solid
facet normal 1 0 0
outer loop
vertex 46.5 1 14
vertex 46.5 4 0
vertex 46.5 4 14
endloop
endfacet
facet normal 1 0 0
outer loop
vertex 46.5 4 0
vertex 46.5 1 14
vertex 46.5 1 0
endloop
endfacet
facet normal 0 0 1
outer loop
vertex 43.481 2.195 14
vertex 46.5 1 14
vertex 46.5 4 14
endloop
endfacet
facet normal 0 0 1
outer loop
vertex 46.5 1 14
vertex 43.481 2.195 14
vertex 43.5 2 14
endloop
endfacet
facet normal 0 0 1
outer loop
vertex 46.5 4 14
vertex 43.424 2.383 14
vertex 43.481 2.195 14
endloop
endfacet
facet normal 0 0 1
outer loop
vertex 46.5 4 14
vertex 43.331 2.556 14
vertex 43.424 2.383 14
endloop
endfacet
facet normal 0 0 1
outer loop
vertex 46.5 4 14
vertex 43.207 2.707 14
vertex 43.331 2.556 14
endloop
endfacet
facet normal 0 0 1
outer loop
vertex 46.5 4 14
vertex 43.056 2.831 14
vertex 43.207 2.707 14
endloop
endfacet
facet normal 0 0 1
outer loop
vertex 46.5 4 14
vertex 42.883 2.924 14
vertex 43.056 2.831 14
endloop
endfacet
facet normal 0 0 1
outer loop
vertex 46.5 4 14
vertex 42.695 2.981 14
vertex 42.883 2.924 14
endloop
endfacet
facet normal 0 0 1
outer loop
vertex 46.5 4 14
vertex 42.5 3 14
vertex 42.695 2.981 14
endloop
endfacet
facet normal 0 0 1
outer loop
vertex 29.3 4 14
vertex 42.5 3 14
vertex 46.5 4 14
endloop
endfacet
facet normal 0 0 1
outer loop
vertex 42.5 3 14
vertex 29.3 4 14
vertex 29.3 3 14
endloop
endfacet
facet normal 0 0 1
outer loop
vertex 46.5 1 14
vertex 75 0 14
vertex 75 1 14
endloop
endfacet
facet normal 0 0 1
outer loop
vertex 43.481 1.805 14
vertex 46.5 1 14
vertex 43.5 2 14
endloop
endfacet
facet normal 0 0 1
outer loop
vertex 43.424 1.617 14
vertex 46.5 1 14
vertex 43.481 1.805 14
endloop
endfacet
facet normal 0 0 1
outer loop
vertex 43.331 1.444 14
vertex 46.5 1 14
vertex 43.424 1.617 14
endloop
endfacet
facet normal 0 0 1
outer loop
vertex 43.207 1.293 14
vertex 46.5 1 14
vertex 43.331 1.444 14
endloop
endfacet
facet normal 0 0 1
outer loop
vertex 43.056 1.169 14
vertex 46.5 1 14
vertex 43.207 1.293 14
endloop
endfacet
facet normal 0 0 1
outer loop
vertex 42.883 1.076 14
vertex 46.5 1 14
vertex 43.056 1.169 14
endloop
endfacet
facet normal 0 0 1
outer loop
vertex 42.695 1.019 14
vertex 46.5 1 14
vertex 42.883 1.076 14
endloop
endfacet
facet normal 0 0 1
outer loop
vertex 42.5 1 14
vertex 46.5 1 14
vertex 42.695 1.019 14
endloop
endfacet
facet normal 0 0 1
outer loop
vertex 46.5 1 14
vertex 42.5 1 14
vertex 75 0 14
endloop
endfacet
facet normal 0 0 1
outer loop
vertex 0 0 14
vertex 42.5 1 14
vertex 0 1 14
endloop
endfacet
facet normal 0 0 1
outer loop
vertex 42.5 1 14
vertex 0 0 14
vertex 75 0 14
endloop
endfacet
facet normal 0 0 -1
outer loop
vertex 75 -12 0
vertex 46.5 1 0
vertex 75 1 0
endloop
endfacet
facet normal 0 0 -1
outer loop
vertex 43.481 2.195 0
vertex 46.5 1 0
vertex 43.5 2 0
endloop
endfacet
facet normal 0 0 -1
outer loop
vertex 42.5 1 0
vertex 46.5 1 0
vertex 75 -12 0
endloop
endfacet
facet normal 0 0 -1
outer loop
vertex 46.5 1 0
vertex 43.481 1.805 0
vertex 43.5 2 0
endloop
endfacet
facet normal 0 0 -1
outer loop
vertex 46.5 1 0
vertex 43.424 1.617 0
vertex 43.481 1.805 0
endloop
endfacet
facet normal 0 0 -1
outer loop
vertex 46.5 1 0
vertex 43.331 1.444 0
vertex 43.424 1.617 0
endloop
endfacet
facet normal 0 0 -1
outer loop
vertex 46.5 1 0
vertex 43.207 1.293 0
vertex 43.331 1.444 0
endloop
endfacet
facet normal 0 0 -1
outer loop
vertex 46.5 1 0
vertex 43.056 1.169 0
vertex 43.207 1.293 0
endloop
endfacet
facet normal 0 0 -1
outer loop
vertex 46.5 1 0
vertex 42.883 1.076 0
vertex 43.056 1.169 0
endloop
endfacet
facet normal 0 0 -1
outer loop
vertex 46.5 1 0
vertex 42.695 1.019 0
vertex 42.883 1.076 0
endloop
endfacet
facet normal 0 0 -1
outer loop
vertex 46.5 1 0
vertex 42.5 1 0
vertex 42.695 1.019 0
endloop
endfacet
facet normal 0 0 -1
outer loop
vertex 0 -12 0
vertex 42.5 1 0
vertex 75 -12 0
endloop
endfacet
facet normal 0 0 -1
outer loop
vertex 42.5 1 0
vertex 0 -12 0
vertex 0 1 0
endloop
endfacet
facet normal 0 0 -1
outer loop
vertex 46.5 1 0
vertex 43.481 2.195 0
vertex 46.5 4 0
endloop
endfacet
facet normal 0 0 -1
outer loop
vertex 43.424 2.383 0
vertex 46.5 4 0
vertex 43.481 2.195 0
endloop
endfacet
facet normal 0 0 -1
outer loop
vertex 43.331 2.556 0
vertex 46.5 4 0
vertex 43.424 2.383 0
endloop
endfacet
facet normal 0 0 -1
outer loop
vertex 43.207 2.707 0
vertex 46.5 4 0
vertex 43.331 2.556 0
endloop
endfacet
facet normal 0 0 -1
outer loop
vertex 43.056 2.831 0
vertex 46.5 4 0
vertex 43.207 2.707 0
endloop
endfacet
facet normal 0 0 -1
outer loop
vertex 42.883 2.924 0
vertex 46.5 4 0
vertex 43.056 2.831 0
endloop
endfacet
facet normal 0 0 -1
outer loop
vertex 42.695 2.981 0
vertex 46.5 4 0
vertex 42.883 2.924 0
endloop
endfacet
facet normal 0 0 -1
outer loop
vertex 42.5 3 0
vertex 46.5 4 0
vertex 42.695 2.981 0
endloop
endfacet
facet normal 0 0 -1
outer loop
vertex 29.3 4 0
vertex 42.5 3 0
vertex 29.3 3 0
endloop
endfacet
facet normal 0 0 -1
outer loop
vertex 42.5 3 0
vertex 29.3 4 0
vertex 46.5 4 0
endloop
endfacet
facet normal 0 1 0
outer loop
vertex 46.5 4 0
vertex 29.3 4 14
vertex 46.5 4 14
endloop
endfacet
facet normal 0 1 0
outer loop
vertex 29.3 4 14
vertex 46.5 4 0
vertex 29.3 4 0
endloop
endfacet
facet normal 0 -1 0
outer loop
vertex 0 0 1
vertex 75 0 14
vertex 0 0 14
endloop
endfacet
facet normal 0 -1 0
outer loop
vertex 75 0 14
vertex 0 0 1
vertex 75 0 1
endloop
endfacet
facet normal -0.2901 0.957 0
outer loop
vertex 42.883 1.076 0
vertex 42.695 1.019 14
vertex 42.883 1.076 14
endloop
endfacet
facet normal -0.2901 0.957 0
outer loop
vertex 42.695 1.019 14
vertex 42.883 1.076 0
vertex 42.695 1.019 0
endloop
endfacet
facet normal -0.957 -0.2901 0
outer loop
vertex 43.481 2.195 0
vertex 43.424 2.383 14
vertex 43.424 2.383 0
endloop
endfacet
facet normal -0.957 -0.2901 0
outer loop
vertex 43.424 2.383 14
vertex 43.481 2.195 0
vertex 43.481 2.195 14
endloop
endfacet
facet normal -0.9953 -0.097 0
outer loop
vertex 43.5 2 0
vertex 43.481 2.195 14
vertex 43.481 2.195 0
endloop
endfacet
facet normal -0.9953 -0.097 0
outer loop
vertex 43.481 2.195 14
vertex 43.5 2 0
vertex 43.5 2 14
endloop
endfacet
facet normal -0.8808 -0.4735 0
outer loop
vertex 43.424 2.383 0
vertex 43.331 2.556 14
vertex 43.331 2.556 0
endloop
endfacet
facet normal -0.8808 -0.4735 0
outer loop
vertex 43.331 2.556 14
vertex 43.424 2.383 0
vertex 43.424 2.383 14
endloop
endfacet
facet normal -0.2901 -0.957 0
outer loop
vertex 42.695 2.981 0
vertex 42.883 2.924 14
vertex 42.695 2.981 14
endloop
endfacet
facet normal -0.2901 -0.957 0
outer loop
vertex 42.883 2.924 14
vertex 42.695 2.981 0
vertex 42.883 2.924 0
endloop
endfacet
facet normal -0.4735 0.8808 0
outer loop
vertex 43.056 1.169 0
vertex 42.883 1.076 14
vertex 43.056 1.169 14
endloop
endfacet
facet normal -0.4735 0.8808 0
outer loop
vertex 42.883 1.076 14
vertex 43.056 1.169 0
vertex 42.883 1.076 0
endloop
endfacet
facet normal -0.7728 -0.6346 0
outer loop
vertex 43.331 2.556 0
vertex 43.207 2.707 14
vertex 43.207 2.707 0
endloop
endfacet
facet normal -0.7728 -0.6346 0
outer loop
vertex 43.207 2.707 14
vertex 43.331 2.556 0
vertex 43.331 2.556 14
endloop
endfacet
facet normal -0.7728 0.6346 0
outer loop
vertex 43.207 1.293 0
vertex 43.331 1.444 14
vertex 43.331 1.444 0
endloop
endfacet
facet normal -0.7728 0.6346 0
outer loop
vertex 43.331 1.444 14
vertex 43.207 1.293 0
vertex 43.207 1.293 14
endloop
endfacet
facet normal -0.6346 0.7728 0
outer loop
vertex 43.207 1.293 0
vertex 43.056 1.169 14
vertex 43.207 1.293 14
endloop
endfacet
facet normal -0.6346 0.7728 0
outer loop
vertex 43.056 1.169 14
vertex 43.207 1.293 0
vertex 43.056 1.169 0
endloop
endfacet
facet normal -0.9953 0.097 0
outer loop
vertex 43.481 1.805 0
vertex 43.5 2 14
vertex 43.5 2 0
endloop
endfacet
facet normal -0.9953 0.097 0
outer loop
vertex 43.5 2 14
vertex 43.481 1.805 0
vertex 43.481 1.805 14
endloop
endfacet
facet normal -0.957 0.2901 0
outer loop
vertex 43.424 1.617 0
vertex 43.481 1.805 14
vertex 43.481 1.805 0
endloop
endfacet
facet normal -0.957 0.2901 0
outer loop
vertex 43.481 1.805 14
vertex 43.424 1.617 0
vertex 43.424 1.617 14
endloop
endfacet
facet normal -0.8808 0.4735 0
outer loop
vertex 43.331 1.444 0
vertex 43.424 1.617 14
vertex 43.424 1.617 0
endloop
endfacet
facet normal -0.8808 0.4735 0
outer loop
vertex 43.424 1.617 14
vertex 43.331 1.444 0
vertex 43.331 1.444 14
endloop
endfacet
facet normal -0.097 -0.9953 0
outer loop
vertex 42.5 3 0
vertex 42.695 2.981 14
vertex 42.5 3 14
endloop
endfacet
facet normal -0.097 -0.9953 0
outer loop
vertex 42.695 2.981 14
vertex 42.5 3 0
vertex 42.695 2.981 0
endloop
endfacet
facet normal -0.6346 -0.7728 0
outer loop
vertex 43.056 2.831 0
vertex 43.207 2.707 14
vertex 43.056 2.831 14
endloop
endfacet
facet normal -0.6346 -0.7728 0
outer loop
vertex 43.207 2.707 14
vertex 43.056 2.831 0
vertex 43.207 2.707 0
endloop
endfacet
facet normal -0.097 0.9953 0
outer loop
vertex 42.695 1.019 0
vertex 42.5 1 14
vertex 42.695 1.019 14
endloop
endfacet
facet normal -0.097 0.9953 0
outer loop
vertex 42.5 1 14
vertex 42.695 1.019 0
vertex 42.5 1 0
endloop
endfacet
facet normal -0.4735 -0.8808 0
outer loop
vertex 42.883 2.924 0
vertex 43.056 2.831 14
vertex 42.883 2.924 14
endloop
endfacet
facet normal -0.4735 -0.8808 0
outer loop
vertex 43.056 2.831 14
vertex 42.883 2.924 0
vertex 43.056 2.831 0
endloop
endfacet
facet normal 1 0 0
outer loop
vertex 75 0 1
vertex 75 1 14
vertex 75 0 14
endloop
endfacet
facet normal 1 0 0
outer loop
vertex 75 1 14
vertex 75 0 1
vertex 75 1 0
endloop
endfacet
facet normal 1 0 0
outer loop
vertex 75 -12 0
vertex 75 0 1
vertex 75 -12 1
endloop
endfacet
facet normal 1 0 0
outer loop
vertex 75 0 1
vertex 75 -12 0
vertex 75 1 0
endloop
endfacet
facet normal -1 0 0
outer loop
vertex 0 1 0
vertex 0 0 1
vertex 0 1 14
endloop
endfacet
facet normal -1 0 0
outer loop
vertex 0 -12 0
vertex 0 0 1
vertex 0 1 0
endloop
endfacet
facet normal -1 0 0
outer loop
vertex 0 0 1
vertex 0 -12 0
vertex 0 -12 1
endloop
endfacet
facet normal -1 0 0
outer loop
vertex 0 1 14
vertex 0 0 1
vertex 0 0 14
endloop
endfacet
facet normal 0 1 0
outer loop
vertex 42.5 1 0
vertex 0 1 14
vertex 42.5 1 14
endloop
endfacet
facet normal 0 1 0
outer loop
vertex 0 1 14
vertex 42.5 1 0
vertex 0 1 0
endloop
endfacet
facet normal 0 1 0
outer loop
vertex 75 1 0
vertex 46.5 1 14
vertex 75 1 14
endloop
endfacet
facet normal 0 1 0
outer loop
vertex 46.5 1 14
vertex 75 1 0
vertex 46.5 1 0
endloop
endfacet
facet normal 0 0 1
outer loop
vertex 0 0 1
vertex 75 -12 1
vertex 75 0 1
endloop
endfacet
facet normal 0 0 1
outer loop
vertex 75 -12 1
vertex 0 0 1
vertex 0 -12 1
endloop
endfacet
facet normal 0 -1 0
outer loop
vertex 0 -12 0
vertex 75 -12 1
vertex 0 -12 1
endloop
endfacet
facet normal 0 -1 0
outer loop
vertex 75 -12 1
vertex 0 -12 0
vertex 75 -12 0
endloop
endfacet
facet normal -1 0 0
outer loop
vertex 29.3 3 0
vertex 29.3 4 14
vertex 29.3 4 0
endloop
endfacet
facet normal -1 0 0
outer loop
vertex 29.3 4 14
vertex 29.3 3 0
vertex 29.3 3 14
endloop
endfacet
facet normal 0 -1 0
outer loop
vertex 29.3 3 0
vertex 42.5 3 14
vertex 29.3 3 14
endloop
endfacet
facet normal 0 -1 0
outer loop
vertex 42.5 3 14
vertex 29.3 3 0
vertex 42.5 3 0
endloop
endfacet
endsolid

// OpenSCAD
//////////////////////////////////////////////////////////////////////////////////////
///
///  FLEXBATTER: Flexing battery holder with built-in spring
///
///  This file generates battery holders for arbitrary cylindrical sizes.
///  The number of batteries and their size is fully parametrized.
///
///  The usual metallic spring at the minus pole is replaced by a
///  flexible printed spring, which is pressing the contacts firmly to 
///  the battery.
///
///  The contacts for the plus and minus pole can easily be made by
///  a few windings of the uninsulated ends of the connecting wires.
///  Each battery compartment contains are several holes to the outside
///  as well ad to the neighboring compartments, through which connecting
///  wires can be passed for easy configuring of parallel, serial or
///  balanced-serial battery packs.
///  
///  The preconfigured battery sizes are:
///  AA, AAA, C, D, 18650(Li-Ion), 18650P(protected Li-Ion), CR123A(16340)
///  
///  Given that the printed plastic spring needs to be flexible, ABS is the material
///  of choice here.
///
//////////////////////////////////////////////////////////////////////////////////////
///
///  2014-09-09 Heinz Spiess, Switzerland
///
///  released under Creative Commons - Attribution - Share Alike licence (CC BY-SA)
//////////////////////////////////////////////////////////////////////////////////////

// build a cube with chamfered edges
module chamfered_cube(size,d=1){
   hull(){
     translate([d,d,0])cube(size-2*[d,d,0]);
     translate([0,d,d])cube(size-2*[0,d,d]);
     translate([d,0,d])cube(size-2*[d,0,d]);
   }
}


// draw an arc width height h between radius r1..r2 and angles a1..a2
module arc(r1,r2,h,a1=0,a2=0){
     if(a2-a1<=180){
        difference(){
           cylinder(r=r2,h=h);
           translate([0,0,-1])cylinder(r=r1,h=h+2);
	   rotate(a2)translate([-r1-r2,0,-1])cube([2*(r1+r2),2*(r1+r2),h+2]);
	   rotate(a1+180)translate([-r1-r2,0,-1])cube([2*(r1+r2),2*(r1+r2),h+2]);
        }
     } else {
           difference(){
              cylinder(r=r2,h=h);
              translate([0,0,-1])cylinder(r=r1,h=h+2);
              intersection(){
	       rotate(a2)translate([-r1-r2,0,-1])cube([2*(r1+r2),2*(r1+r2),h+2]);
	       rotate(a1+180)translate([-r1-r2,0,-1])cube([2*(r1+r2),2*(r1+r2),h+2]);
	      }
           }
     }
}

/////////////////////////////////////////////////////////////////////////////////
// sline - generate a "snake line" of width w and height h 
// with a arbitrary sequence of segments defined by a radius and a turning angle
//
//   angle[i] > 0  left turn / counter-clockwise
//   angle[i] < 0  left turn / clockwise
//   angle[i] = 0  straight segment with length radius[i]
//
/////////////////////////////////////////////////////////////////////////////////
// Heinz Spiess, 2014-09-06 (CC BY-SA)
/////////////////////////////////////////////////////////////////////////////////
module sline(angle,radius,i,w,h){
   scale([angle[i]>=0?1:-1,1,1])
      assign(r=abs(radius[i]))assign(a=angle[i])
         translate([a?r:0,0,0]){
	    translate([-w/2,-r-0.01,0])cube([w,0.02,h]); // tiny overlap!
            if(a)arc(r-w/2,r+w/2,0,a,h=h);
	    else if(r>0)translate([-w/2,-r,0])cube([w,r,h]);
      if(i+1<len(angle))
           rotate(angle[i])
	      translate([a?-r:0,a?0:-r,0])
	         sline(angle,radius,i+1,w,h);
  }
}

//////////////////////////////////////////////////////////////////////////////////
//
//  FLEXBATTER:  Flexing battery holder with integrated plastic spring
//
//////////////////////////////////////////////////////////////////////////////////
module flexbatter(n=1,l=65,d=18,hf=0.75,r=4,shd=3,eps=0.28,el=0,xchan=[1/4,3/4],$fn=24){
ew=0.56;   // extrusion width
eh=0.25;   // extrusion height
w = 4*ew;  // case wall thickness
ws = 2*ew; // spring wall thickness
ch = w-ws; // edge chamfering
deepen=0; //deepening for side grip of batteries
//el = 0;  // extra length in spring
//eps = 0.28;
//shd = 3; // screw hole diameter
//hf=0.75;
//xchan=[1/4,3/4]; // relative position of traversal wire channels

r = d/5+2*ws; // linear spring length (depends on sline() call!)

   for(i=[0:n-1])translate([0,i*(d+w+ws),0]){ // generate n battery cases
      difference(){
         
         union(){
            difference(){
               // main body
               translate([0,-w-d/2,0])
	          chamfered_cube([l+w,d+2*w+(i<n-1?ws:0),hf*d+w+ch],ch);
	       // main cavity
               translate([-2,-d/2,w])cube([2+l,d,d+1]);
	       // cavity for locating plastic spring
               translate([-1,-d/2,-1])cube([2,d,d+w+2]);
	       // small cylindrical carving of walls and bottom
	       if(eps>0)translate([-1,0,d/2+w])rotate([0,90,0])cylinder(r=d/2+eps,h=l+1);
            }
      
            // plastic spring for minus pole
            for(sy=[-1,1])scale([1,sy,1])assign(D=d+2*w-2*ws-0.7){
               translate([ch,d/2+w-ws/2,0])rotate(-90)
		  //sline([90,0,120,90,120,90,0],[d/8+2,d/6,d/8-1,d/8,-d/8,d/8,d/2],0,ws,hf*d+w);
		  sline([0,180,0,180,0,-180,0,90,0],[r+ch+el,D/4,el,D/12,el/2,D/12,1+el/2,D/5,D/3],0,ws,hf*d+w);


            }
         }
      
         // lower and upper holes for contacts
         for(z=[-2*ws,2*ws])
            translate([-2*ws,-w,w-ws/2+d/2+z])cube([l+2*w+2,2*w,ws]);
      
         // longitudinal bottom wire channel
         translate([-2*ws,0,0])rotate([0,90,0])cylinder(r=w/2,h=l+w+2+r,$fn=5);
      
         // traversal bottom wire channels
         for(x=l*xchan)translate([x,-d/2-w-1,eh]) rotate([-90,0,0])cylinder(r=w/2,h=d+2*w+ws+2,$fn=6);
   
         // grip deepening
	 if(deepen>0)
            translate([w+l/2-0.5,-d/2-w-0.01,w+d+l])
	       rotate([-90,0,0]){
	          cylinder(r=l+deepen*d,h=d+2*w+2*ws+2,$fn=72);
	          if(i==0)cylinder(r1=l+deepen*d+ch,r2=l+deepen*d,h=ch+0.02,$fn=72);
	          if(i==n-1)translate([0,0,d+2*w-ch])cylinder(r2=l+deepen*d+ch,r1=l+deepen*d,h=ch+0.02,$fn=72);

               }
         // conical screw holes in corners
         for(x=[7+shd,l-2*shd])for(y=[-d/2+shd,d/2-shd])
             translate([x,y,-1]){
                cylinder(r=shd/2,h=w+2);
                translate([0,0,w-shd/2+1])cylinder(r1=shd/2,r2=shd,h=shd/2+0.01);
             }

         // holes for wires passing inside
         for(sy=[-1,1])scale([1,sy,1]){
	    translate([l-1,-d/2,w])cube([w+2,2,2]);
            for(x=[3,l-7])translate([x,-d/2-w-ws-1,w])cube([3,w+ws+3,2]); 
            translate([3,-d/2+w/2-0.75,-1])cube([3,1.5,w+2]); 
            translate([-0.5,-d/2+w/2,0])rotate([0,90,0])cylinder(r=w/2,h=6.5,$fn=5);
         }

         // engrave battery symbol
	 translate([w+l/2,d/4+1,w])cube([l/5,d/4.5,4*eh],true);
	 translate([w+l/2+l/10,d/4+1,w])cube([d/7,d/10,4*eh],true);
	 // engrave plus symbol
	 assign(sy=(l>12*shd)?1:-1){ // for short batteries +- on the side
	    translate([w+l/2+l/(sy>0?5:10),sy*(d/4+1),w]){
	       cube([1,d/4,4*eh],true);
	       cube([d/4,1,4*eh],true);
            }
	 // engrave minus symbol
	    translate([w+l/2-l/(sy>0?5:10),sy*(d/4+1),w])
	       cube([1,d/4,4*eh],true);
         }
   
         //correction for middle separators
         //if(i<n-1) translate([-d,d/2+w-ws/2,-1])cube([d,ws/2+0.1,d+2]);
	 //else translate([1,d/2+w,-0.01])cylinder(r1=ch,r2=0,h=ch);
         //if(i>0) translate([-d,-d/2-w-0.1,-1])cube([d,ws/2+0.1,d+2]);
	 //else translate([1,-d/2-w,-0.01])cylinder(r1=ch,r2=0,h=ch);


      }


      // horizontal contact bulges (+ and - pole)
      for(x=[-0.3,l])
         hull()for(y=[-3+el,3-el])
            translate([x,y,w+d/2])sphere(r=ws);
   
      // vertical contact bulge (+ pole only)
      if(0)hull()for(z=[-3+el,3-el])for(x=[0,w-ws])
            translate([l+x,0,w+d/2+z])sphere(r=ws);



   }

}

module flexbatter18650(n=1){
   flexbatter(n=n,l=65.5,d=18.4,hf=0.75,shd=3,eps=0.28);
}  

module flexbatter18650P(n=1){
   flexbatter(n=n,l=67.5,d=18.4,hf=0.75,shd=3,eps=0.28);
}  

module flexbatterCR123A(n=1){
   flexbatter(n=n,l=35.1,d=16.7,hf=0.75,shd=3,xchan=[0.5],eps=0.28);
}  

module flexbatterD(n=1){
   flexbatter(n=n,l=61.5,d=34.0,hf=0.75,shd=3,eps=0.28);
}  

module flexbatterC(n=1){
   flexbatter(n=n,l=51.6,d=26.4,hf=0.75,shd=3,eps=0.28);
}  

module flexbatterAA(n=1){
   flexbatter(n=n,l=51.6,d=14.4,hf=0.80,shd=2.5,el=0.5,eps=0.28);
}  

module flexbatterAAA(n=1){
   flexbatter(n=n,l=46.1,d=10.45,hf=0.84,shd=2,el=1,xchan=[0.5],eps=0);
}  

module flexbatter18650x1(){ // AUTO_MAKE_STL
  flexbatter18650(n=1);
}

module flexbatter18650Px1(){ // AUTO_MAKE_STL
  flexbatter18650P(n=1);
}

module flexbatterCR123Ax1(){ // AUTO_MAKE_STL
  flexbatterCR123A(n=1);
}

module flexbatterAAx1(){ // AUTO_MAKE_STL
  flexbatterAA(n=1);
}

module flexbatterAAAx1(){ // AUTO_MAKE_STL
  flexbatterAAA(n=1);
}

module flexbatterCx1(){ // AUTO_MAKE_STL
  flexbatterC(n=1);
}

module flexbatter18650x2(){ // AUTO_MAKE_STL
  flexbatter18650(n=2);
}

module flexbatterAAx2(){ // AUTO_MAKE_STL
  flexbatterAA(n=2);
}

module flexbatterAAAx2(){ // AUTO_MAKE_STL
  flexbatterAAA(n=2);
}

module flexbatterCx2(){ // AUTO_MAKE_STL
  flexbatterC(n=2);
}

module flexbatter18650x3(){ // AUTO_MAKE_STL
  flexbatter18650(n=3);
}

module flexbatterAAx3(){ // AUTO_MAKE_STL
  flexbatterAA(n=3);
}

module flexbatterAAAx3(){ // AUTO_MAKE_STL
  flexbatterAAA(n=3);
}

module flexbatter18650x4(){ // AUTO_MAKE_STL
  flexbatter18650(n=4);
}

module flexbatterAAx4(){ // AUTO_MAKE_STL
  flexbatterAA(n=4);
}

module flexbatterAAAx4(){ // AUTO_MAKE_STL
  flexbatterAAA(n=4);
}

module rackhook(){
  raillen=75;
  railh=14;
  railth=1;
  restde=12;
  pegw=11;
  pegth=1.9;//1.8
  flapw=30;
  flaph=14;
  flapth=railth;
  hookth=flapth;
  hookw=pegw*1.2;
  hookgap=pegth+0.1;
  spineth=flapth+hookgap+hookth;
  xofs=-10;


	//rail
	cube([raillen,railth,railh]);
	//rest
	translate([0,-restde,0]) cube([raillen,restde,1]);
  //outer plate
  translate([(raillen/2-flapw/2),0,0]) cube([flapw,flapth,flaph]);
  //hook
  translate([(raillen/2-flapw/2)+flapw-hookw+xofs,flapth+hookgap,0]) cube([hookw,flapth,flaph]);

	difference(){
	   union(){		
		  //spine of hook 
		  translate([(raillen/2+flapw/2)+xofs,0,0]) cube([spineth,spineth,flaph]);
	   }//union
	 //rounder of spine
	 translate([(raillen/2+flapw/2)+xofs,railth+hookgap/2,-0.05]) cylinder(d=hookgap,h=flaph+0.1,$fn=32);
  }//difference
  //inflaps 
    
}

rackhook();

// uncomment as needed:

//flexbatterCR123A(n=2);
//rotate([0,0,0])translate([0,0,-9])flexbatter18650(n=1);
//translate([0,40,0])rotate([90,0,0])translate([0,0,-9])flexbatter18650(n=1);
//translate([0,80,0])rotate([180,0,0])translate([0,0,-9])flexbatter18650(n=1);
//translate([0,120,0])rotate([-90,0,0])translate([0,0,-9])flexbatter18650(n=1);
//translate([0,33,0])flexbatter18650(n=2);
//translate([0,90,0])flexbatter18650(n=3);
//translate([-90,33,0])flexbatter18650(n=4);
//translate([0,28,0])flexbatterAA(n=2);
//translate([0,50,0])flexbatterAAA(n=1);
//flexbatterC(n=1);
//flexbatterD(n=1);
